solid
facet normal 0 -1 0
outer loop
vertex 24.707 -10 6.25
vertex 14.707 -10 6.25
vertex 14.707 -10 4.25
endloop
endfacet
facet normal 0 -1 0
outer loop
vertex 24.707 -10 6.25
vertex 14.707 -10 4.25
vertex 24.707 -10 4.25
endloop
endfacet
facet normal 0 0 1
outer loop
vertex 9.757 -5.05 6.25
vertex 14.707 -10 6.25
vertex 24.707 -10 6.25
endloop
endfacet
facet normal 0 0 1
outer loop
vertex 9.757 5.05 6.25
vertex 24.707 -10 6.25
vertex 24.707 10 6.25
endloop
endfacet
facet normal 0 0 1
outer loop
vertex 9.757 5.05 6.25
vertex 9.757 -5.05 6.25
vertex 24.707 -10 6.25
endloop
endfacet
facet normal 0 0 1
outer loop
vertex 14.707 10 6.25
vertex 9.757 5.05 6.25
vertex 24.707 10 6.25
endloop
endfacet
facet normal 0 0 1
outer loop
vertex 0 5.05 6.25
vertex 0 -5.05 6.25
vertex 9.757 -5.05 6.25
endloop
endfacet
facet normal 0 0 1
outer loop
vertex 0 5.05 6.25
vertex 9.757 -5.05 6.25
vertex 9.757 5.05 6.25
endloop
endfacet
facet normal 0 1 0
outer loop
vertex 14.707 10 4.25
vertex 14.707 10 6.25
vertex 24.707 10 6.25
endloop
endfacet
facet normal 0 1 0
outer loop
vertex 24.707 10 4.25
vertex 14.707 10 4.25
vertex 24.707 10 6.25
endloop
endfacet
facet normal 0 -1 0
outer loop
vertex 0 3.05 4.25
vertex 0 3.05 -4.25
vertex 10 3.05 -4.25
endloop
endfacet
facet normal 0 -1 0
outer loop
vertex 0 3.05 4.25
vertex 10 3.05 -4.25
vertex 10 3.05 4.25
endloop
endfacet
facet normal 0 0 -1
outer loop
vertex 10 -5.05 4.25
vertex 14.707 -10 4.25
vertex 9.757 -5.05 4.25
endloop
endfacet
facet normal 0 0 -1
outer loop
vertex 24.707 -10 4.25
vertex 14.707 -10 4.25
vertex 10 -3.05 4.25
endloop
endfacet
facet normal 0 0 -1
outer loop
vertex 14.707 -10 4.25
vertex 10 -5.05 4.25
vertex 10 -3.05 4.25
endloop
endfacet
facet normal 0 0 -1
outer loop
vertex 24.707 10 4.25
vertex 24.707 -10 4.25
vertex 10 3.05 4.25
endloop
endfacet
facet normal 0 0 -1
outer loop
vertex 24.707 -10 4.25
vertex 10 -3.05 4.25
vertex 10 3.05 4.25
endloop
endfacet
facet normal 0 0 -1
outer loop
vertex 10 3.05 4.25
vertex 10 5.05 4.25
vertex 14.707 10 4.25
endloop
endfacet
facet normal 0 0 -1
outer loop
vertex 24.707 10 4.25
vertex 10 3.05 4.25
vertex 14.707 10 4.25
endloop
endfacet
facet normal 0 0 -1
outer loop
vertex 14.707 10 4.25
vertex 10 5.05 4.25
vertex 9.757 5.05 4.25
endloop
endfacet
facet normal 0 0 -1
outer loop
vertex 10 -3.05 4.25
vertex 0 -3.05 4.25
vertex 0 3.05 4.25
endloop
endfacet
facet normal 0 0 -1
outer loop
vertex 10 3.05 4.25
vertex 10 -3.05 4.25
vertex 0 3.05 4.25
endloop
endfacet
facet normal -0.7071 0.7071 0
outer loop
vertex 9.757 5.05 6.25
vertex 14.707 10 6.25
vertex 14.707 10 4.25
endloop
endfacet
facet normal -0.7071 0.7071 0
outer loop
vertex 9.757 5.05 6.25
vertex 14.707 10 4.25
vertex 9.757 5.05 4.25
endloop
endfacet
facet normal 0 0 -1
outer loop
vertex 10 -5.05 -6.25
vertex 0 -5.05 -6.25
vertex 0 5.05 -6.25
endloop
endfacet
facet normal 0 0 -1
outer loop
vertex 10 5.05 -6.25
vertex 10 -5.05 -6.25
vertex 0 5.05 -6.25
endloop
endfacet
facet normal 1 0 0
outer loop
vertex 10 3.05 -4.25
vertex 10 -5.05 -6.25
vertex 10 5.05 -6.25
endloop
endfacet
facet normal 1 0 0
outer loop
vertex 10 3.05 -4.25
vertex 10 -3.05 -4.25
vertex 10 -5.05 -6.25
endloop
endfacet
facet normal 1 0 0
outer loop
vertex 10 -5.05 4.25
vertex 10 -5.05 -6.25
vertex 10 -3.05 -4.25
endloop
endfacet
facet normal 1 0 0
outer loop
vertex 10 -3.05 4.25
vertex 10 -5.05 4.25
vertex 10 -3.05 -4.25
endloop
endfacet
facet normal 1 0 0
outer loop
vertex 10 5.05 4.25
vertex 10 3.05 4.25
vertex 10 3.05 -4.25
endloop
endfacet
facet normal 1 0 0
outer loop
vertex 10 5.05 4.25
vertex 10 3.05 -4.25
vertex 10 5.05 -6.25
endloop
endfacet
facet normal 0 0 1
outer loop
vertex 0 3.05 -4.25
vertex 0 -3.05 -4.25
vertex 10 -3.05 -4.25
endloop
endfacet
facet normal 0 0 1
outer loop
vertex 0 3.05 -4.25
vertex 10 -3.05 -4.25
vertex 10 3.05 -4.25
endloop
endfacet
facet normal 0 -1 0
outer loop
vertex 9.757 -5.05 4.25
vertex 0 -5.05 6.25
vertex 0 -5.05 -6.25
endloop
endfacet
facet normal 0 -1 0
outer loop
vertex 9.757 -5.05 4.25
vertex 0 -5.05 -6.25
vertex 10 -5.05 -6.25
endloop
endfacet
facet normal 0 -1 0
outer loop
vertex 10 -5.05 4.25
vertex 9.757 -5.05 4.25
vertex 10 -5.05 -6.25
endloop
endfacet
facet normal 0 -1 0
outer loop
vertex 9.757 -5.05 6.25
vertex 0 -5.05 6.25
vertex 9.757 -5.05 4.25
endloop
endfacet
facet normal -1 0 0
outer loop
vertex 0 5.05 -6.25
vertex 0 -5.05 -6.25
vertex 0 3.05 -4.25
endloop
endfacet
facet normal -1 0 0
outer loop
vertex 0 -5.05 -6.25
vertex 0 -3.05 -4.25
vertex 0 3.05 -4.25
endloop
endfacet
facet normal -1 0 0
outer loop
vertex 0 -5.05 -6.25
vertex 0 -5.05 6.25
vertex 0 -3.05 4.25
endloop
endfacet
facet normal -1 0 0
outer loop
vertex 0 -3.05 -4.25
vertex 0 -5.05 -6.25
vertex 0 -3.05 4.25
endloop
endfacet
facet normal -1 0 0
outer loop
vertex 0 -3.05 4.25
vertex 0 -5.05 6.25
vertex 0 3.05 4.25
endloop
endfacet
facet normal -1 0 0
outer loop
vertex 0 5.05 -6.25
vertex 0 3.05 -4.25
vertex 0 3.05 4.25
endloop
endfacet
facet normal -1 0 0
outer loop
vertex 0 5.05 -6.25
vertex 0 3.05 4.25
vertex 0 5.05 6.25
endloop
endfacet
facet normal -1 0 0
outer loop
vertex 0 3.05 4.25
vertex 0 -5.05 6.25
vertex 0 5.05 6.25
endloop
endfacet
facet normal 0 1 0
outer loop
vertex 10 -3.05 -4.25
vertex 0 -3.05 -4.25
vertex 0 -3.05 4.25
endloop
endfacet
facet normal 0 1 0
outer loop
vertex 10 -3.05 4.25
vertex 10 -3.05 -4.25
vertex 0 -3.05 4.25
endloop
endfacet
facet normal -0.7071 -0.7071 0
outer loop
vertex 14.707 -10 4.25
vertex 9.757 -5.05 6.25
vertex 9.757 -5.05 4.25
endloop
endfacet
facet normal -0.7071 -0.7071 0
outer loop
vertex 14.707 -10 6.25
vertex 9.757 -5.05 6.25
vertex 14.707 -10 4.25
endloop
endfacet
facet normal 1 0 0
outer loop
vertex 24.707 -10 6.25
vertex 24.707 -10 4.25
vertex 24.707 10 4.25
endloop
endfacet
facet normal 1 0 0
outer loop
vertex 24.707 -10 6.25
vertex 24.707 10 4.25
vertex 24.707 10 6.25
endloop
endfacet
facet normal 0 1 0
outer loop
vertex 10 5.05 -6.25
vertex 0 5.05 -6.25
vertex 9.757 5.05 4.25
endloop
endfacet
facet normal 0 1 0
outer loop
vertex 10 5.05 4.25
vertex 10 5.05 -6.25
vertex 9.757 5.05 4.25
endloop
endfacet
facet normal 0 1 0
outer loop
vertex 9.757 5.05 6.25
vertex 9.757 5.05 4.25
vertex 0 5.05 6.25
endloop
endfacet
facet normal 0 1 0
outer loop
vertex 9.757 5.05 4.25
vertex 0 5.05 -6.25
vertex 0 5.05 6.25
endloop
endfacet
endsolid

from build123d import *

# Parameters (mm, degrees)
F0_W        = 10.1
F0_H        = 12.5
F0_W_2      = 6.1
F0_H_2      = 8.5
F1_DEPTH    = 10
F2_W        = 15
F2_H        = 2
F3_DEPTH    = 10
F4_T4_DEPTH = 27.7168298797
F4_T9_DEPTH = 27.7168298797


# Not quite as in the source:
# - a fillet or chamfer that OpenCascade refuses, or shapes differently, is made with other operations: its cross-section is extruded or revolved along the edge and cut away or added


with BuildPart() as f1:
    # F0 (on Right) → F1 (new body)
    with BuildSketch(Plane.YZ):
        Rectangle(F0_W, F0_H)
        Rectangle(F0_W_2, F0_H_2, mode=Mode.SUBTRACT)
    extrude(amount=F1_DEPTH)

    # F2 (on Front) → F3 (join, symmetric)
    with BuildSketch(Plane.XZ):
        with Locations((17.2066340968, 5.25)):
            Rectangle(F2_W, F2_H)
    extrude(amount=F3_DEPTH, both=True)

    # F4: chamfer of 5 on 2 edges, made by hand


with BuildPart() as f4_tool2:
    # F4_s3 → F4_t4 (new body)
    with BuildSketch(Plane.XY.offset(19.1084149398)):
        Polygon((14.7066340968, 10), (9.7066340968, 5), (9.7066340968, 10), align=None)
    extrude(amount=-F4_T4_DEPTH)

    split(bisect_by=Plane.XZ.offset(-5.05), keep=Keep.BOTTOM)


with BuildPart() as f1_1:
    add(f1.part)

    # F4_t1: cut F4_tool2
    add(f4_tool2.part, mode=Mode.SUBTRACT)


with BuildPart() as f4_tool7:
    # F4_s8 → F4_t9 (new body)
    with BuildSketch(Plane.XY.offset(19.1084149398)):
        Polygon((9.7066340968, -5), (14.7066340968, -10), (9.7066340968, -10), align=None)
    extrude(amount=-F4_T9_DEPTH)

    split(bisect_by=Plane.XZ.offset(5.05), keep=Keep.TOP)


with BuildPart() as f1_2:
    add(f1_1.part)

    # F4_t6: cut F4_tool7
    add(f4_tool7.part, mode=Mode.SUBTRACT)


solid = f1_2.part
